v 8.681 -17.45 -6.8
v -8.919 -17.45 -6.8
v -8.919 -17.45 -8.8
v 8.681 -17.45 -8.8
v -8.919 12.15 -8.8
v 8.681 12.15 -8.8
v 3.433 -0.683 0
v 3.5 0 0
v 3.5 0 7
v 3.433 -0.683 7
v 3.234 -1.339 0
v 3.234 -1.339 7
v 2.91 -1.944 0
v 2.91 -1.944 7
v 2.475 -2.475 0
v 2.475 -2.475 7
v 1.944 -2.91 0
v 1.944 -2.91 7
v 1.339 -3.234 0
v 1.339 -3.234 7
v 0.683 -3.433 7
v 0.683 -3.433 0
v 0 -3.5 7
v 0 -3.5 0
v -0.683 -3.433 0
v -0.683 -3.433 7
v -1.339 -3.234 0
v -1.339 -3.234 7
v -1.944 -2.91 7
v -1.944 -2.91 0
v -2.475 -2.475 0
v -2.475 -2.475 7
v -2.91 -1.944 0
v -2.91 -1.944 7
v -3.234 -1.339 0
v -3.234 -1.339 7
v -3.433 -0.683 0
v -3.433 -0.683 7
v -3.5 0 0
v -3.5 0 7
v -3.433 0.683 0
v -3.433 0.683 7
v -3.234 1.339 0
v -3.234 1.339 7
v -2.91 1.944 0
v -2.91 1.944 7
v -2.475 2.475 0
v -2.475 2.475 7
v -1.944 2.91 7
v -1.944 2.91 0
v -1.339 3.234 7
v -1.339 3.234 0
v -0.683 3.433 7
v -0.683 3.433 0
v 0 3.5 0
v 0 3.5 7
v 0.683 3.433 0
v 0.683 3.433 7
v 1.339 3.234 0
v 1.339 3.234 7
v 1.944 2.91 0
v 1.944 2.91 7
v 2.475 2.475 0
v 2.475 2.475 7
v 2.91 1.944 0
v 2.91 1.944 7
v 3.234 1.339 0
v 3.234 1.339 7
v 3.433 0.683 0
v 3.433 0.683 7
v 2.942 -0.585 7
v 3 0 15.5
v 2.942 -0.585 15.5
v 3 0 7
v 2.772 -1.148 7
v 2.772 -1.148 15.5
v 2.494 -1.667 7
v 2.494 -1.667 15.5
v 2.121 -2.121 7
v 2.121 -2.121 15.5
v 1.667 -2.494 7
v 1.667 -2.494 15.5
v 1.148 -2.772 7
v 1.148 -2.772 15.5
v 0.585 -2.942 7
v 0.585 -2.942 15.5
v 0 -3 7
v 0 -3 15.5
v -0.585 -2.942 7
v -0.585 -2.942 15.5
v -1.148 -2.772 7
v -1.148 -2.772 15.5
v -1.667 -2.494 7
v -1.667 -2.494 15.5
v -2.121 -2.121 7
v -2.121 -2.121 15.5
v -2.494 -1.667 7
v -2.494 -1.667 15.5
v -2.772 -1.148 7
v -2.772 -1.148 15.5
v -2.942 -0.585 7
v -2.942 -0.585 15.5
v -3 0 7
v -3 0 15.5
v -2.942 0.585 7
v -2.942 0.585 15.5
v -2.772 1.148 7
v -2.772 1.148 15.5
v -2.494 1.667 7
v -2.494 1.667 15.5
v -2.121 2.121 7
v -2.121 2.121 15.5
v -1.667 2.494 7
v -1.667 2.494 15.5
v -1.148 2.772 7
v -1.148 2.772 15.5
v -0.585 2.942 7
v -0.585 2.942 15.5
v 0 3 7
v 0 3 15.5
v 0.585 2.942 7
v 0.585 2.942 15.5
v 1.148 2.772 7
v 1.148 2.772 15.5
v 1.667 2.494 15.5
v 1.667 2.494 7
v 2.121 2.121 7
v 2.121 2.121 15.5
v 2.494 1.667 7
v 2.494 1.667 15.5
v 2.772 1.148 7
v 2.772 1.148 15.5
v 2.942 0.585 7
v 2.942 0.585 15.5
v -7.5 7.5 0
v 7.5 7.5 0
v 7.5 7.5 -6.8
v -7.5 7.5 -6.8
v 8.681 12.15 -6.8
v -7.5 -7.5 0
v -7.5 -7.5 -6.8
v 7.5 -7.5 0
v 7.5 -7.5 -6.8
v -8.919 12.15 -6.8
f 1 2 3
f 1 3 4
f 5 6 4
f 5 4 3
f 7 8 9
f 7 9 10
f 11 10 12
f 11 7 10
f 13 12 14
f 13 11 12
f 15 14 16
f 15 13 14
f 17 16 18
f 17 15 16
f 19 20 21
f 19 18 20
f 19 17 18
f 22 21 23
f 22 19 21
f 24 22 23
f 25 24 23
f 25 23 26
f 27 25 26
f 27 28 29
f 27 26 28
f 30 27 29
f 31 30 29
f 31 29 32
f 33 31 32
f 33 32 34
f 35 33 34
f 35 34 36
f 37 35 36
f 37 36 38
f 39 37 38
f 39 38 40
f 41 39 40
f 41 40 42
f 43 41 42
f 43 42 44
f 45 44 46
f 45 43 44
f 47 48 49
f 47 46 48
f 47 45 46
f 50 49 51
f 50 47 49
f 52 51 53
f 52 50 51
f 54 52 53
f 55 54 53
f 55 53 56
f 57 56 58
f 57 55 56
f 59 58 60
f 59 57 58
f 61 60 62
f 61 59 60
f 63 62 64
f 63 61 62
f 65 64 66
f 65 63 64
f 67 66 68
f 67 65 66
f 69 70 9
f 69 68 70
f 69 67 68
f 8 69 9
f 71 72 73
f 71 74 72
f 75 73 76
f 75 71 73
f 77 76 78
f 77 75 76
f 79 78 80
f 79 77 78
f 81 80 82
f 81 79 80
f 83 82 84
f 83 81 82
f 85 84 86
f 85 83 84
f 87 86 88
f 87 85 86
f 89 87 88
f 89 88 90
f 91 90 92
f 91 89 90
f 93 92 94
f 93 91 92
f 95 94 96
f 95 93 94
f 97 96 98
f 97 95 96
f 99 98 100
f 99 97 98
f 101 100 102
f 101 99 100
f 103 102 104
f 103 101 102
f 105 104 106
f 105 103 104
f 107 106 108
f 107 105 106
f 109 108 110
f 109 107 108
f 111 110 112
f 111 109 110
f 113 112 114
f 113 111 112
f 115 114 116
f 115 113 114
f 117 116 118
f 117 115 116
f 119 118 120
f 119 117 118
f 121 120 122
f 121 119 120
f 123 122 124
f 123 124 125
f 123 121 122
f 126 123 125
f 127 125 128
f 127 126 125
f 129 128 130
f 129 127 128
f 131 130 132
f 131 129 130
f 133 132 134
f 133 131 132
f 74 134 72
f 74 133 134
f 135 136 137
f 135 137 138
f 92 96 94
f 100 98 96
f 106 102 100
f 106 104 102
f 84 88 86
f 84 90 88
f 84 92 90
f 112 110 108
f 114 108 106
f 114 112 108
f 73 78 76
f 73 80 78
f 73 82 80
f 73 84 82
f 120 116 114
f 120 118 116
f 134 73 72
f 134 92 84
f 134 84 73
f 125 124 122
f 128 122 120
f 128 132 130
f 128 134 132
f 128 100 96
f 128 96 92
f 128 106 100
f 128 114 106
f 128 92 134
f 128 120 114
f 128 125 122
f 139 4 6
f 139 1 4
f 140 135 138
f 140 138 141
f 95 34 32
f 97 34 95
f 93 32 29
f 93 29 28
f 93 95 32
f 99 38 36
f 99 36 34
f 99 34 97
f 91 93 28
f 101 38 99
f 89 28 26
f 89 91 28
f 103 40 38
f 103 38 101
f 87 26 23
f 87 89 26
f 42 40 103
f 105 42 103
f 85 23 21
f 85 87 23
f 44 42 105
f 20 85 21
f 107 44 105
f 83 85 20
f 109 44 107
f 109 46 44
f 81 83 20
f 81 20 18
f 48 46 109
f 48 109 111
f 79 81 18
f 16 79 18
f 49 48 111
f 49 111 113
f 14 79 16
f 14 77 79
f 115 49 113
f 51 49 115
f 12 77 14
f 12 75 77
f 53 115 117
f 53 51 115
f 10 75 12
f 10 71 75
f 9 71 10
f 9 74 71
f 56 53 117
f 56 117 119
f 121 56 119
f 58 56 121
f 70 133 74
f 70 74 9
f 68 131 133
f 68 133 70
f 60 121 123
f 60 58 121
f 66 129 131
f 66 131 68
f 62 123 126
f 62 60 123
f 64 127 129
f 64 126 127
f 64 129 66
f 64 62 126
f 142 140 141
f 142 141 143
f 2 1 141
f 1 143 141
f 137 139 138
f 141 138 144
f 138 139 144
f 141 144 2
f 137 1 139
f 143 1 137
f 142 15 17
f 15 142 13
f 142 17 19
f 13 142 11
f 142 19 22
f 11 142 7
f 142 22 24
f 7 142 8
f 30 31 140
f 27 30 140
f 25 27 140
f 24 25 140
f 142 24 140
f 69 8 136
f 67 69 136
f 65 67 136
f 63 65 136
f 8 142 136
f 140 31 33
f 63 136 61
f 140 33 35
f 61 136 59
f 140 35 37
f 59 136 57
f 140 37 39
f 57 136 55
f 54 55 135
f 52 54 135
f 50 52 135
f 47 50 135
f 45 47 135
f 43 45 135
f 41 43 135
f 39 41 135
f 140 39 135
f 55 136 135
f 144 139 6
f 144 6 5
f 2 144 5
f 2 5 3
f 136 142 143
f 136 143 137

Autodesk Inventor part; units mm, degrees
ref_plane "YZ Plane" through (0, 0, 0) normal (1, 0, 0) x (0, 1, 0)
ref_plane "XZ Plane" through (0, 0, 0) normal (0, 1, 0) x (-1, 0, 0)
ref_plane "XY Plane" through (0, 0, 0) normal (0, 0, 1) x (1, 0, 0)
sketch "Skizze1" plane through (0, 0, 0) normal (0, 0, 1) x (1, 0, 0)
  circle A0 centre (0, 0) radius 3.5
  dimension "d0" = 7
extrude "Extrusion1" add sketch "Skizze1" along normal blind 7
sketch "Skizze2" plane through (0, 0, 0) normal (0, 0, -1) x (-1, 0, 0)
  line L0 (-7.5, 7.5) -> (7.5, 7.5)
  line L1 (7.5, 7.5) -> (7.5, -7.5)
  line L2 (7.5, -7.5) -> (-7.5, -7.5)
  line L3 (-7.5, -7.5) -> (-7.5, 7.5)
  line L4 (-7.5, 7.5) -> (7.5, -7.5) construction
  line L5 (7.5, 7.5) -> (-7.5, -7.5) construction
  point P0 (0, 0)
  dimension "d3" = 15
  dimension "d4" = 15
extrude "Extrusion2" add sketch "Skizze2" along normal blind 6.8
sketch "Skizze3" plane through (0, 0, -6.8) normal (0, 0, -1) x (-1, 0, 0)
  line L0 (-8.6809, 12.15) -> (8.9191, 12.15)
  line L1 (8.9191, 12.15) -> (8.9191, -17.45)
  line L2 (8.9191, -17.45) -> (-8.6809, -17.45)
  line L3 (-8.6809, -17.45) -> (-8.6809, 12.15)
  line L4 (7.5, 7.5) -> (-7.5, 7.5) projected
  point P0 (0, 0)
  dimension "d7" = 17.6
  dimension "d8" = 29.6
  dimension "d9" = 4.65
extrude "Extrusion3" add sketch "Skizze3" along normal blind 2
sketch "Skizze4" plane through (0, 0, 7) normal (0, 0, 1) x (1, 0, 0)
  circle A0 centre (0, 0) radius 3
  dimension "d12" = 6
extrude "Extrusion4" add sketch "Skizze4" along normal blind 13.5
sketch "Skizze5" plane through (0, 0, 20.5) normal (0, 0, 1) x (1, 0, 0)
  line L0 (-8.9965, 8.617) -> (9.175, 8.617)
  line L1 (9.175, 8.617) -> (9.175, -9.4653)
  line L2 (9.175, -9.4653) -> (-8.9965, -9.4653)
  line L3 (-8.9965, -9.4653) -> (-8.9965, 8.617)
  point P0 (0, 0)
extrude "Extrusion5" cut sketch "Skizze5" against normal blind 5
equation "\"d4\" = d3"
properties part number "encoder"
